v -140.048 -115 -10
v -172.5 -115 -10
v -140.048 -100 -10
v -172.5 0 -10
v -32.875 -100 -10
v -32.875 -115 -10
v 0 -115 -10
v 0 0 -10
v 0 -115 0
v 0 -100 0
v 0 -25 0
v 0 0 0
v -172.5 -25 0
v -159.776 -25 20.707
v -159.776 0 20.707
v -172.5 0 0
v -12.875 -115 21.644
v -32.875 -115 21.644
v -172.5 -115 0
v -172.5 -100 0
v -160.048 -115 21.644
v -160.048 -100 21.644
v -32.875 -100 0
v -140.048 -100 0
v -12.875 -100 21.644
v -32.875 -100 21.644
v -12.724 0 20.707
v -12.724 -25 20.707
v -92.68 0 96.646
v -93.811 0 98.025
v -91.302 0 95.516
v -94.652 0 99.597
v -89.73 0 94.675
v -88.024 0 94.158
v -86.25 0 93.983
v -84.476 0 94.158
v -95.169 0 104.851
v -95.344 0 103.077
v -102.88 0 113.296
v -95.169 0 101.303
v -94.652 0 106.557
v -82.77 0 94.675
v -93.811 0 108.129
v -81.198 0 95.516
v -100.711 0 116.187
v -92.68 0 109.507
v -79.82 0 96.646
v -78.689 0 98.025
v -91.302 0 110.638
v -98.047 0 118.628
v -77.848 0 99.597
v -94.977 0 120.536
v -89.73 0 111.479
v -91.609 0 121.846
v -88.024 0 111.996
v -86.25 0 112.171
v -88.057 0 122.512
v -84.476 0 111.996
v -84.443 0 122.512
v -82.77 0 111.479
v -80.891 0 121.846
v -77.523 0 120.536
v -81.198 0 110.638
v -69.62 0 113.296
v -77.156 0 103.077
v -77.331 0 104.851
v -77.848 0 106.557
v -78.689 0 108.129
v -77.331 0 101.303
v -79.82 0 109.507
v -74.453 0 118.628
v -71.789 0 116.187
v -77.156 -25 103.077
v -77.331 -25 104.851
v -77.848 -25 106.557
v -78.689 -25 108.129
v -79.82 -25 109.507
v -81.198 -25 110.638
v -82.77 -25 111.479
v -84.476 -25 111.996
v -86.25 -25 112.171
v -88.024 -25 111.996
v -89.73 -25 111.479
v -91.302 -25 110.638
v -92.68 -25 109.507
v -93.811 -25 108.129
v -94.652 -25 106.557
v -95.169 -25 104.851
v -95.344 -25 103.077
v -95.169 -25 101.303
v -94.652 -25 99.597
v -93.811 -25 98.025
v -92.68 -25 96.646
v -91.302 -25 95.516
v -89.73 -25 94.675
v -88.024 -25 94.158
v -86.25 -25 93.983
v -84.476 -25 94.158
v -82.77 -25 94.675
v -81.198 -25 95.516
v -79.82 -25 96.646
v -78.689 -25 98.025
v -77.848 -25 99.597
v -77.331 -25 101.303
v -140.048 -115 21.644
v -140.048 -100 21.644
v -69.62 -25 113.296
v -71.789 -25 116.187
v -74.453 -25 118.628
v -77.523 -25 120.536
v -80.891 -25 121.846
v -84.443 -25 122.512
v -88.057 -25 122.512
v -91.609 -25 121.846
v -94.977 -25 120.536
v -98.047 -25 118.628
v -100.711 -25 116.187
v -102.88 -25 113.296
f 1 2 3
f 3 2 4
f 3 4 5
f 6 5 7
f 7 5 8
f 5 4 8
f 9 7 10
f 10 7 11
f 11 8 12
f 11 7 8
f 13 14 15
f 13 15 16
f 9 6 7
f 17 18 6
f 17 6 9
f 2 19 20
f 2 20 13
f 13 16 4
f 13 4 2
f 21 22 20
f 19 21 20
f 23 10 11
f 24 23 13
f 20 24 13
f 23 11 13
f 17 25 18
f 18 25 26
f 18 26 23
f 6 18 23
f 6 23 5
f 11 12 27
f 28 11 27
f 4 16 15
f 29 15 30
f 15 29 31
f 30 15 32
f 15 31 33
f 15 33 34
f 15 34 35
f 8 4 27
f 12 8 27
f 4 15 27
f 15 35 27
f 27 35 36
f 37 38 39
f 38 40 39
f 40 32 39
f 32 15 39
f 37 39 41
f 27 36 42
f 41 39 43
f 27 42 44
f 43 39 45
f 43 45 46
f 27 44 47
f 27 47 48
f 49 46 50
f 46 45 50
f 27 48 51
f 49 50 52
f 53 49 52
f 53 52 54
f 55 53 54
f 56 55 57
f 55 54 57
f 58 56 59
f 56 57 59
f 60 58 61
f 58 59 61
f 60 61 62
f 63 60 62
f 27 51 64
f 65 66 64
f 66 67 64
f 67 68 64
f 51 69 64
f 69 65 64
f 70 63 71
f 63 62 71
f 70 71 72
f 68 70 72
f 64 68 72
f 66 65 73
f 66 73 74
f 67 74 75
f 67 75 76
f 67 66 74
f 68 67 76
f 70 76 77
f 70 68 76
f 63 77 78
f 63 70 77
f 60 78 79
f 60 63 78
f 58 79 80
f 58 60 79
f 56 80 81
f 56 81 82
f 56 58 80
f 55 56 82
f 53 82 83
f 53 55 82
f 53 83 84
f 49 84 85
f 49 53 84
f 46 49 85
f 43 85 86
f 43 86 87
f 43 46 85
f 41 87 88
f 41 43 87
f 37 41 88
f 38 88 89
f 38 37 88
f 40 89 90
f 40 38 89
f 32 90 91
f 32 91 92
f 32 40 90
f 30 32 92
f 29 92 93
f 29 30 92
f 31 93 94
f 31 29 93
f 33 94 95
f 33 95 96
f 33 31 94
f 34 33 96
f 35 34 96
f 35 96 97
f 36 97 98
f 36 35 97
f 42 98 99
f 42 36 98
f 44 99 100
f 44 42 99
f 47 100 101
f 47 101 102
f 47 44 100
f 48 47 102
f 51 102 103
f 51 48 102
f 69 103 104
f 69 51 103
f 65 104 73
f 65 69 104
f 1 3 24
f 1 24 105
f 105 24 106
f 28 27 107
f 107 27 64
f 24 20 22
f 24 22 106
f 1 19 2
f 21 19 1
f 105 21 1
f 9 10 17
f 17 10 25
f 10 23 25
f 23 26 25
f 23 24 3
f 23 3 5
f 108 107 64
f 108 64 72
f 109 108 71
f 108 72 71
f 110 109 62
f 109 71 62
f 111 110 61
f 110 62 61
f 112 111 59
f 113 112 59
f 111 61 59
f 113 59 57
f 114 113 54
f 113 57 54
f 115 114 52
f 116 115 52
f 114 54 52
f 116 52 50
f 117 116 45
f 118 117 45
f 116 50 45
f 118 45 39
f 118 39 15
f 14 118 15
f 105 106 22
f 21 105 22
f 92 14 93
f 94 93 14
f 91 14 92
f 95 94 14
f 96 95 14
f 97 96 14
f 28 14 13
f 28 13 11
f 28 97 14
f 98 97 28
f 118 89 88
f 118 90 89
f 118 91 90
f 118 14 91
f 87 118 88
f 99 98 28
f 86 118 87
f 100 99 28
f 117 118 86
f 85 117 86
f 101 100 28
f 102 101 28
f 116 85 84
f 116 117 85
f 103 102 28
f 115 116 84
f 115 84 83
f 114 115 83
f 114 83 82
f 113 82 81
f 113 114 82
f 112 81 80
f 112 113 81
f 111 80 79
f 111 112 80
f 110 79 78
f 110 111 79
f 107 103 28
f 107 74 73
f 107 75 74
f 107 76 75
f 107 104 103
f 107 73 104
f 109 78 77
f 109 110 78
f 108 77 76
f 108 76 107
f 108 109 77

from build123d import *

# Parameters (mm, degrees)
F0_R     = 9.0940365485
F1_DEPTH = 25
F0_W     = 105.1995866001
F0_H     = 10
F0_W_2   = 33.5022409036
F0_W_3   = 33.7981618941
F2_DEPTH = 100
F4_DEPTH = 15


with BuildPart() as f1:
    # F0 (on Front) → F1 (new body)
    with BuildSketch(Plane.XZ):
        with BuildLine():
            Line((-138.9977484941, 0), (-33.7981618941, 0))
            Line((-33.7981618941, 0), (-33.7981618941, 20.7065277838))
            Line((-33.7981618941, 20.7065277838), (-12.7240127639, 20.7065277838))
            Line((-12.7240127639, 20.7065277838), (-69.619662283, 113.2961352765))
            ThreePointArc((-69.619662283, 113.2961352765), (-86.2499946989, 122.5961471904), (-102.8803271148, 113.2961352765))
            Line((-102.8803271148, 113.2961352765), (-159.7759766339, 20.7065277838))
            Line((-159.7759766339, 20.7065277838), (-138.9977484941, 20.7065277838))
            Line((-138.9977484941, 20.7065277838), (-138.9977484941, 0))
        make_face()
        with Locations((-86.2499946989, 103.0769153215)):
            Circle(F0_R, mode=Mode.SUBTRACT)
        Polygon((-172.4999893978, 0), (-138.9977484941, 0), (-138.9977484941, 20.7065277838), (-159.7759766339, 20.7065277838), align=None)
        Polygon((-33.7981618941, 0), (0, 0), (-12.7240127639, 20.7065277838), (-33.7981618941, 20.7065277838), align=None)
    extrude(amount=F1_DEPTH)

    # F0 (on Front) → F2 (join)
    with BuildSketch(Plane.XZ):
        with Locations((-86.3979551941, -5)):
            Rectangle(F0_W, F0_H)
        with Locations((-155.748868946, -5)):
            Rectangle(F0_W_2, F0_H)
        with Locations((-16.899080947, -5)):
            Rectangle(F0_W_3, F0_H)
    extrude(amount=F2_DEPTH)

    # F3 (on face) → F4 (join)
    with BuildSketch(Plane.XZ.offset(100)):
        Polygon((-140.0482910872, 21.6435156763), (-160.0482910872, 21.6435156763), (-172.4999893978, 0), (-172.4999893978, -10), (-140.0482910872, -10), align=None)
        Polygon((0, -10), (0, 0), (-12.8745967522, 21.6435156763), (-32.8745967522, 21.6435156763), (-32.8745967522, -10), align=None)
    extrude(amount=F4_DEPTH)


solid = f1.part
